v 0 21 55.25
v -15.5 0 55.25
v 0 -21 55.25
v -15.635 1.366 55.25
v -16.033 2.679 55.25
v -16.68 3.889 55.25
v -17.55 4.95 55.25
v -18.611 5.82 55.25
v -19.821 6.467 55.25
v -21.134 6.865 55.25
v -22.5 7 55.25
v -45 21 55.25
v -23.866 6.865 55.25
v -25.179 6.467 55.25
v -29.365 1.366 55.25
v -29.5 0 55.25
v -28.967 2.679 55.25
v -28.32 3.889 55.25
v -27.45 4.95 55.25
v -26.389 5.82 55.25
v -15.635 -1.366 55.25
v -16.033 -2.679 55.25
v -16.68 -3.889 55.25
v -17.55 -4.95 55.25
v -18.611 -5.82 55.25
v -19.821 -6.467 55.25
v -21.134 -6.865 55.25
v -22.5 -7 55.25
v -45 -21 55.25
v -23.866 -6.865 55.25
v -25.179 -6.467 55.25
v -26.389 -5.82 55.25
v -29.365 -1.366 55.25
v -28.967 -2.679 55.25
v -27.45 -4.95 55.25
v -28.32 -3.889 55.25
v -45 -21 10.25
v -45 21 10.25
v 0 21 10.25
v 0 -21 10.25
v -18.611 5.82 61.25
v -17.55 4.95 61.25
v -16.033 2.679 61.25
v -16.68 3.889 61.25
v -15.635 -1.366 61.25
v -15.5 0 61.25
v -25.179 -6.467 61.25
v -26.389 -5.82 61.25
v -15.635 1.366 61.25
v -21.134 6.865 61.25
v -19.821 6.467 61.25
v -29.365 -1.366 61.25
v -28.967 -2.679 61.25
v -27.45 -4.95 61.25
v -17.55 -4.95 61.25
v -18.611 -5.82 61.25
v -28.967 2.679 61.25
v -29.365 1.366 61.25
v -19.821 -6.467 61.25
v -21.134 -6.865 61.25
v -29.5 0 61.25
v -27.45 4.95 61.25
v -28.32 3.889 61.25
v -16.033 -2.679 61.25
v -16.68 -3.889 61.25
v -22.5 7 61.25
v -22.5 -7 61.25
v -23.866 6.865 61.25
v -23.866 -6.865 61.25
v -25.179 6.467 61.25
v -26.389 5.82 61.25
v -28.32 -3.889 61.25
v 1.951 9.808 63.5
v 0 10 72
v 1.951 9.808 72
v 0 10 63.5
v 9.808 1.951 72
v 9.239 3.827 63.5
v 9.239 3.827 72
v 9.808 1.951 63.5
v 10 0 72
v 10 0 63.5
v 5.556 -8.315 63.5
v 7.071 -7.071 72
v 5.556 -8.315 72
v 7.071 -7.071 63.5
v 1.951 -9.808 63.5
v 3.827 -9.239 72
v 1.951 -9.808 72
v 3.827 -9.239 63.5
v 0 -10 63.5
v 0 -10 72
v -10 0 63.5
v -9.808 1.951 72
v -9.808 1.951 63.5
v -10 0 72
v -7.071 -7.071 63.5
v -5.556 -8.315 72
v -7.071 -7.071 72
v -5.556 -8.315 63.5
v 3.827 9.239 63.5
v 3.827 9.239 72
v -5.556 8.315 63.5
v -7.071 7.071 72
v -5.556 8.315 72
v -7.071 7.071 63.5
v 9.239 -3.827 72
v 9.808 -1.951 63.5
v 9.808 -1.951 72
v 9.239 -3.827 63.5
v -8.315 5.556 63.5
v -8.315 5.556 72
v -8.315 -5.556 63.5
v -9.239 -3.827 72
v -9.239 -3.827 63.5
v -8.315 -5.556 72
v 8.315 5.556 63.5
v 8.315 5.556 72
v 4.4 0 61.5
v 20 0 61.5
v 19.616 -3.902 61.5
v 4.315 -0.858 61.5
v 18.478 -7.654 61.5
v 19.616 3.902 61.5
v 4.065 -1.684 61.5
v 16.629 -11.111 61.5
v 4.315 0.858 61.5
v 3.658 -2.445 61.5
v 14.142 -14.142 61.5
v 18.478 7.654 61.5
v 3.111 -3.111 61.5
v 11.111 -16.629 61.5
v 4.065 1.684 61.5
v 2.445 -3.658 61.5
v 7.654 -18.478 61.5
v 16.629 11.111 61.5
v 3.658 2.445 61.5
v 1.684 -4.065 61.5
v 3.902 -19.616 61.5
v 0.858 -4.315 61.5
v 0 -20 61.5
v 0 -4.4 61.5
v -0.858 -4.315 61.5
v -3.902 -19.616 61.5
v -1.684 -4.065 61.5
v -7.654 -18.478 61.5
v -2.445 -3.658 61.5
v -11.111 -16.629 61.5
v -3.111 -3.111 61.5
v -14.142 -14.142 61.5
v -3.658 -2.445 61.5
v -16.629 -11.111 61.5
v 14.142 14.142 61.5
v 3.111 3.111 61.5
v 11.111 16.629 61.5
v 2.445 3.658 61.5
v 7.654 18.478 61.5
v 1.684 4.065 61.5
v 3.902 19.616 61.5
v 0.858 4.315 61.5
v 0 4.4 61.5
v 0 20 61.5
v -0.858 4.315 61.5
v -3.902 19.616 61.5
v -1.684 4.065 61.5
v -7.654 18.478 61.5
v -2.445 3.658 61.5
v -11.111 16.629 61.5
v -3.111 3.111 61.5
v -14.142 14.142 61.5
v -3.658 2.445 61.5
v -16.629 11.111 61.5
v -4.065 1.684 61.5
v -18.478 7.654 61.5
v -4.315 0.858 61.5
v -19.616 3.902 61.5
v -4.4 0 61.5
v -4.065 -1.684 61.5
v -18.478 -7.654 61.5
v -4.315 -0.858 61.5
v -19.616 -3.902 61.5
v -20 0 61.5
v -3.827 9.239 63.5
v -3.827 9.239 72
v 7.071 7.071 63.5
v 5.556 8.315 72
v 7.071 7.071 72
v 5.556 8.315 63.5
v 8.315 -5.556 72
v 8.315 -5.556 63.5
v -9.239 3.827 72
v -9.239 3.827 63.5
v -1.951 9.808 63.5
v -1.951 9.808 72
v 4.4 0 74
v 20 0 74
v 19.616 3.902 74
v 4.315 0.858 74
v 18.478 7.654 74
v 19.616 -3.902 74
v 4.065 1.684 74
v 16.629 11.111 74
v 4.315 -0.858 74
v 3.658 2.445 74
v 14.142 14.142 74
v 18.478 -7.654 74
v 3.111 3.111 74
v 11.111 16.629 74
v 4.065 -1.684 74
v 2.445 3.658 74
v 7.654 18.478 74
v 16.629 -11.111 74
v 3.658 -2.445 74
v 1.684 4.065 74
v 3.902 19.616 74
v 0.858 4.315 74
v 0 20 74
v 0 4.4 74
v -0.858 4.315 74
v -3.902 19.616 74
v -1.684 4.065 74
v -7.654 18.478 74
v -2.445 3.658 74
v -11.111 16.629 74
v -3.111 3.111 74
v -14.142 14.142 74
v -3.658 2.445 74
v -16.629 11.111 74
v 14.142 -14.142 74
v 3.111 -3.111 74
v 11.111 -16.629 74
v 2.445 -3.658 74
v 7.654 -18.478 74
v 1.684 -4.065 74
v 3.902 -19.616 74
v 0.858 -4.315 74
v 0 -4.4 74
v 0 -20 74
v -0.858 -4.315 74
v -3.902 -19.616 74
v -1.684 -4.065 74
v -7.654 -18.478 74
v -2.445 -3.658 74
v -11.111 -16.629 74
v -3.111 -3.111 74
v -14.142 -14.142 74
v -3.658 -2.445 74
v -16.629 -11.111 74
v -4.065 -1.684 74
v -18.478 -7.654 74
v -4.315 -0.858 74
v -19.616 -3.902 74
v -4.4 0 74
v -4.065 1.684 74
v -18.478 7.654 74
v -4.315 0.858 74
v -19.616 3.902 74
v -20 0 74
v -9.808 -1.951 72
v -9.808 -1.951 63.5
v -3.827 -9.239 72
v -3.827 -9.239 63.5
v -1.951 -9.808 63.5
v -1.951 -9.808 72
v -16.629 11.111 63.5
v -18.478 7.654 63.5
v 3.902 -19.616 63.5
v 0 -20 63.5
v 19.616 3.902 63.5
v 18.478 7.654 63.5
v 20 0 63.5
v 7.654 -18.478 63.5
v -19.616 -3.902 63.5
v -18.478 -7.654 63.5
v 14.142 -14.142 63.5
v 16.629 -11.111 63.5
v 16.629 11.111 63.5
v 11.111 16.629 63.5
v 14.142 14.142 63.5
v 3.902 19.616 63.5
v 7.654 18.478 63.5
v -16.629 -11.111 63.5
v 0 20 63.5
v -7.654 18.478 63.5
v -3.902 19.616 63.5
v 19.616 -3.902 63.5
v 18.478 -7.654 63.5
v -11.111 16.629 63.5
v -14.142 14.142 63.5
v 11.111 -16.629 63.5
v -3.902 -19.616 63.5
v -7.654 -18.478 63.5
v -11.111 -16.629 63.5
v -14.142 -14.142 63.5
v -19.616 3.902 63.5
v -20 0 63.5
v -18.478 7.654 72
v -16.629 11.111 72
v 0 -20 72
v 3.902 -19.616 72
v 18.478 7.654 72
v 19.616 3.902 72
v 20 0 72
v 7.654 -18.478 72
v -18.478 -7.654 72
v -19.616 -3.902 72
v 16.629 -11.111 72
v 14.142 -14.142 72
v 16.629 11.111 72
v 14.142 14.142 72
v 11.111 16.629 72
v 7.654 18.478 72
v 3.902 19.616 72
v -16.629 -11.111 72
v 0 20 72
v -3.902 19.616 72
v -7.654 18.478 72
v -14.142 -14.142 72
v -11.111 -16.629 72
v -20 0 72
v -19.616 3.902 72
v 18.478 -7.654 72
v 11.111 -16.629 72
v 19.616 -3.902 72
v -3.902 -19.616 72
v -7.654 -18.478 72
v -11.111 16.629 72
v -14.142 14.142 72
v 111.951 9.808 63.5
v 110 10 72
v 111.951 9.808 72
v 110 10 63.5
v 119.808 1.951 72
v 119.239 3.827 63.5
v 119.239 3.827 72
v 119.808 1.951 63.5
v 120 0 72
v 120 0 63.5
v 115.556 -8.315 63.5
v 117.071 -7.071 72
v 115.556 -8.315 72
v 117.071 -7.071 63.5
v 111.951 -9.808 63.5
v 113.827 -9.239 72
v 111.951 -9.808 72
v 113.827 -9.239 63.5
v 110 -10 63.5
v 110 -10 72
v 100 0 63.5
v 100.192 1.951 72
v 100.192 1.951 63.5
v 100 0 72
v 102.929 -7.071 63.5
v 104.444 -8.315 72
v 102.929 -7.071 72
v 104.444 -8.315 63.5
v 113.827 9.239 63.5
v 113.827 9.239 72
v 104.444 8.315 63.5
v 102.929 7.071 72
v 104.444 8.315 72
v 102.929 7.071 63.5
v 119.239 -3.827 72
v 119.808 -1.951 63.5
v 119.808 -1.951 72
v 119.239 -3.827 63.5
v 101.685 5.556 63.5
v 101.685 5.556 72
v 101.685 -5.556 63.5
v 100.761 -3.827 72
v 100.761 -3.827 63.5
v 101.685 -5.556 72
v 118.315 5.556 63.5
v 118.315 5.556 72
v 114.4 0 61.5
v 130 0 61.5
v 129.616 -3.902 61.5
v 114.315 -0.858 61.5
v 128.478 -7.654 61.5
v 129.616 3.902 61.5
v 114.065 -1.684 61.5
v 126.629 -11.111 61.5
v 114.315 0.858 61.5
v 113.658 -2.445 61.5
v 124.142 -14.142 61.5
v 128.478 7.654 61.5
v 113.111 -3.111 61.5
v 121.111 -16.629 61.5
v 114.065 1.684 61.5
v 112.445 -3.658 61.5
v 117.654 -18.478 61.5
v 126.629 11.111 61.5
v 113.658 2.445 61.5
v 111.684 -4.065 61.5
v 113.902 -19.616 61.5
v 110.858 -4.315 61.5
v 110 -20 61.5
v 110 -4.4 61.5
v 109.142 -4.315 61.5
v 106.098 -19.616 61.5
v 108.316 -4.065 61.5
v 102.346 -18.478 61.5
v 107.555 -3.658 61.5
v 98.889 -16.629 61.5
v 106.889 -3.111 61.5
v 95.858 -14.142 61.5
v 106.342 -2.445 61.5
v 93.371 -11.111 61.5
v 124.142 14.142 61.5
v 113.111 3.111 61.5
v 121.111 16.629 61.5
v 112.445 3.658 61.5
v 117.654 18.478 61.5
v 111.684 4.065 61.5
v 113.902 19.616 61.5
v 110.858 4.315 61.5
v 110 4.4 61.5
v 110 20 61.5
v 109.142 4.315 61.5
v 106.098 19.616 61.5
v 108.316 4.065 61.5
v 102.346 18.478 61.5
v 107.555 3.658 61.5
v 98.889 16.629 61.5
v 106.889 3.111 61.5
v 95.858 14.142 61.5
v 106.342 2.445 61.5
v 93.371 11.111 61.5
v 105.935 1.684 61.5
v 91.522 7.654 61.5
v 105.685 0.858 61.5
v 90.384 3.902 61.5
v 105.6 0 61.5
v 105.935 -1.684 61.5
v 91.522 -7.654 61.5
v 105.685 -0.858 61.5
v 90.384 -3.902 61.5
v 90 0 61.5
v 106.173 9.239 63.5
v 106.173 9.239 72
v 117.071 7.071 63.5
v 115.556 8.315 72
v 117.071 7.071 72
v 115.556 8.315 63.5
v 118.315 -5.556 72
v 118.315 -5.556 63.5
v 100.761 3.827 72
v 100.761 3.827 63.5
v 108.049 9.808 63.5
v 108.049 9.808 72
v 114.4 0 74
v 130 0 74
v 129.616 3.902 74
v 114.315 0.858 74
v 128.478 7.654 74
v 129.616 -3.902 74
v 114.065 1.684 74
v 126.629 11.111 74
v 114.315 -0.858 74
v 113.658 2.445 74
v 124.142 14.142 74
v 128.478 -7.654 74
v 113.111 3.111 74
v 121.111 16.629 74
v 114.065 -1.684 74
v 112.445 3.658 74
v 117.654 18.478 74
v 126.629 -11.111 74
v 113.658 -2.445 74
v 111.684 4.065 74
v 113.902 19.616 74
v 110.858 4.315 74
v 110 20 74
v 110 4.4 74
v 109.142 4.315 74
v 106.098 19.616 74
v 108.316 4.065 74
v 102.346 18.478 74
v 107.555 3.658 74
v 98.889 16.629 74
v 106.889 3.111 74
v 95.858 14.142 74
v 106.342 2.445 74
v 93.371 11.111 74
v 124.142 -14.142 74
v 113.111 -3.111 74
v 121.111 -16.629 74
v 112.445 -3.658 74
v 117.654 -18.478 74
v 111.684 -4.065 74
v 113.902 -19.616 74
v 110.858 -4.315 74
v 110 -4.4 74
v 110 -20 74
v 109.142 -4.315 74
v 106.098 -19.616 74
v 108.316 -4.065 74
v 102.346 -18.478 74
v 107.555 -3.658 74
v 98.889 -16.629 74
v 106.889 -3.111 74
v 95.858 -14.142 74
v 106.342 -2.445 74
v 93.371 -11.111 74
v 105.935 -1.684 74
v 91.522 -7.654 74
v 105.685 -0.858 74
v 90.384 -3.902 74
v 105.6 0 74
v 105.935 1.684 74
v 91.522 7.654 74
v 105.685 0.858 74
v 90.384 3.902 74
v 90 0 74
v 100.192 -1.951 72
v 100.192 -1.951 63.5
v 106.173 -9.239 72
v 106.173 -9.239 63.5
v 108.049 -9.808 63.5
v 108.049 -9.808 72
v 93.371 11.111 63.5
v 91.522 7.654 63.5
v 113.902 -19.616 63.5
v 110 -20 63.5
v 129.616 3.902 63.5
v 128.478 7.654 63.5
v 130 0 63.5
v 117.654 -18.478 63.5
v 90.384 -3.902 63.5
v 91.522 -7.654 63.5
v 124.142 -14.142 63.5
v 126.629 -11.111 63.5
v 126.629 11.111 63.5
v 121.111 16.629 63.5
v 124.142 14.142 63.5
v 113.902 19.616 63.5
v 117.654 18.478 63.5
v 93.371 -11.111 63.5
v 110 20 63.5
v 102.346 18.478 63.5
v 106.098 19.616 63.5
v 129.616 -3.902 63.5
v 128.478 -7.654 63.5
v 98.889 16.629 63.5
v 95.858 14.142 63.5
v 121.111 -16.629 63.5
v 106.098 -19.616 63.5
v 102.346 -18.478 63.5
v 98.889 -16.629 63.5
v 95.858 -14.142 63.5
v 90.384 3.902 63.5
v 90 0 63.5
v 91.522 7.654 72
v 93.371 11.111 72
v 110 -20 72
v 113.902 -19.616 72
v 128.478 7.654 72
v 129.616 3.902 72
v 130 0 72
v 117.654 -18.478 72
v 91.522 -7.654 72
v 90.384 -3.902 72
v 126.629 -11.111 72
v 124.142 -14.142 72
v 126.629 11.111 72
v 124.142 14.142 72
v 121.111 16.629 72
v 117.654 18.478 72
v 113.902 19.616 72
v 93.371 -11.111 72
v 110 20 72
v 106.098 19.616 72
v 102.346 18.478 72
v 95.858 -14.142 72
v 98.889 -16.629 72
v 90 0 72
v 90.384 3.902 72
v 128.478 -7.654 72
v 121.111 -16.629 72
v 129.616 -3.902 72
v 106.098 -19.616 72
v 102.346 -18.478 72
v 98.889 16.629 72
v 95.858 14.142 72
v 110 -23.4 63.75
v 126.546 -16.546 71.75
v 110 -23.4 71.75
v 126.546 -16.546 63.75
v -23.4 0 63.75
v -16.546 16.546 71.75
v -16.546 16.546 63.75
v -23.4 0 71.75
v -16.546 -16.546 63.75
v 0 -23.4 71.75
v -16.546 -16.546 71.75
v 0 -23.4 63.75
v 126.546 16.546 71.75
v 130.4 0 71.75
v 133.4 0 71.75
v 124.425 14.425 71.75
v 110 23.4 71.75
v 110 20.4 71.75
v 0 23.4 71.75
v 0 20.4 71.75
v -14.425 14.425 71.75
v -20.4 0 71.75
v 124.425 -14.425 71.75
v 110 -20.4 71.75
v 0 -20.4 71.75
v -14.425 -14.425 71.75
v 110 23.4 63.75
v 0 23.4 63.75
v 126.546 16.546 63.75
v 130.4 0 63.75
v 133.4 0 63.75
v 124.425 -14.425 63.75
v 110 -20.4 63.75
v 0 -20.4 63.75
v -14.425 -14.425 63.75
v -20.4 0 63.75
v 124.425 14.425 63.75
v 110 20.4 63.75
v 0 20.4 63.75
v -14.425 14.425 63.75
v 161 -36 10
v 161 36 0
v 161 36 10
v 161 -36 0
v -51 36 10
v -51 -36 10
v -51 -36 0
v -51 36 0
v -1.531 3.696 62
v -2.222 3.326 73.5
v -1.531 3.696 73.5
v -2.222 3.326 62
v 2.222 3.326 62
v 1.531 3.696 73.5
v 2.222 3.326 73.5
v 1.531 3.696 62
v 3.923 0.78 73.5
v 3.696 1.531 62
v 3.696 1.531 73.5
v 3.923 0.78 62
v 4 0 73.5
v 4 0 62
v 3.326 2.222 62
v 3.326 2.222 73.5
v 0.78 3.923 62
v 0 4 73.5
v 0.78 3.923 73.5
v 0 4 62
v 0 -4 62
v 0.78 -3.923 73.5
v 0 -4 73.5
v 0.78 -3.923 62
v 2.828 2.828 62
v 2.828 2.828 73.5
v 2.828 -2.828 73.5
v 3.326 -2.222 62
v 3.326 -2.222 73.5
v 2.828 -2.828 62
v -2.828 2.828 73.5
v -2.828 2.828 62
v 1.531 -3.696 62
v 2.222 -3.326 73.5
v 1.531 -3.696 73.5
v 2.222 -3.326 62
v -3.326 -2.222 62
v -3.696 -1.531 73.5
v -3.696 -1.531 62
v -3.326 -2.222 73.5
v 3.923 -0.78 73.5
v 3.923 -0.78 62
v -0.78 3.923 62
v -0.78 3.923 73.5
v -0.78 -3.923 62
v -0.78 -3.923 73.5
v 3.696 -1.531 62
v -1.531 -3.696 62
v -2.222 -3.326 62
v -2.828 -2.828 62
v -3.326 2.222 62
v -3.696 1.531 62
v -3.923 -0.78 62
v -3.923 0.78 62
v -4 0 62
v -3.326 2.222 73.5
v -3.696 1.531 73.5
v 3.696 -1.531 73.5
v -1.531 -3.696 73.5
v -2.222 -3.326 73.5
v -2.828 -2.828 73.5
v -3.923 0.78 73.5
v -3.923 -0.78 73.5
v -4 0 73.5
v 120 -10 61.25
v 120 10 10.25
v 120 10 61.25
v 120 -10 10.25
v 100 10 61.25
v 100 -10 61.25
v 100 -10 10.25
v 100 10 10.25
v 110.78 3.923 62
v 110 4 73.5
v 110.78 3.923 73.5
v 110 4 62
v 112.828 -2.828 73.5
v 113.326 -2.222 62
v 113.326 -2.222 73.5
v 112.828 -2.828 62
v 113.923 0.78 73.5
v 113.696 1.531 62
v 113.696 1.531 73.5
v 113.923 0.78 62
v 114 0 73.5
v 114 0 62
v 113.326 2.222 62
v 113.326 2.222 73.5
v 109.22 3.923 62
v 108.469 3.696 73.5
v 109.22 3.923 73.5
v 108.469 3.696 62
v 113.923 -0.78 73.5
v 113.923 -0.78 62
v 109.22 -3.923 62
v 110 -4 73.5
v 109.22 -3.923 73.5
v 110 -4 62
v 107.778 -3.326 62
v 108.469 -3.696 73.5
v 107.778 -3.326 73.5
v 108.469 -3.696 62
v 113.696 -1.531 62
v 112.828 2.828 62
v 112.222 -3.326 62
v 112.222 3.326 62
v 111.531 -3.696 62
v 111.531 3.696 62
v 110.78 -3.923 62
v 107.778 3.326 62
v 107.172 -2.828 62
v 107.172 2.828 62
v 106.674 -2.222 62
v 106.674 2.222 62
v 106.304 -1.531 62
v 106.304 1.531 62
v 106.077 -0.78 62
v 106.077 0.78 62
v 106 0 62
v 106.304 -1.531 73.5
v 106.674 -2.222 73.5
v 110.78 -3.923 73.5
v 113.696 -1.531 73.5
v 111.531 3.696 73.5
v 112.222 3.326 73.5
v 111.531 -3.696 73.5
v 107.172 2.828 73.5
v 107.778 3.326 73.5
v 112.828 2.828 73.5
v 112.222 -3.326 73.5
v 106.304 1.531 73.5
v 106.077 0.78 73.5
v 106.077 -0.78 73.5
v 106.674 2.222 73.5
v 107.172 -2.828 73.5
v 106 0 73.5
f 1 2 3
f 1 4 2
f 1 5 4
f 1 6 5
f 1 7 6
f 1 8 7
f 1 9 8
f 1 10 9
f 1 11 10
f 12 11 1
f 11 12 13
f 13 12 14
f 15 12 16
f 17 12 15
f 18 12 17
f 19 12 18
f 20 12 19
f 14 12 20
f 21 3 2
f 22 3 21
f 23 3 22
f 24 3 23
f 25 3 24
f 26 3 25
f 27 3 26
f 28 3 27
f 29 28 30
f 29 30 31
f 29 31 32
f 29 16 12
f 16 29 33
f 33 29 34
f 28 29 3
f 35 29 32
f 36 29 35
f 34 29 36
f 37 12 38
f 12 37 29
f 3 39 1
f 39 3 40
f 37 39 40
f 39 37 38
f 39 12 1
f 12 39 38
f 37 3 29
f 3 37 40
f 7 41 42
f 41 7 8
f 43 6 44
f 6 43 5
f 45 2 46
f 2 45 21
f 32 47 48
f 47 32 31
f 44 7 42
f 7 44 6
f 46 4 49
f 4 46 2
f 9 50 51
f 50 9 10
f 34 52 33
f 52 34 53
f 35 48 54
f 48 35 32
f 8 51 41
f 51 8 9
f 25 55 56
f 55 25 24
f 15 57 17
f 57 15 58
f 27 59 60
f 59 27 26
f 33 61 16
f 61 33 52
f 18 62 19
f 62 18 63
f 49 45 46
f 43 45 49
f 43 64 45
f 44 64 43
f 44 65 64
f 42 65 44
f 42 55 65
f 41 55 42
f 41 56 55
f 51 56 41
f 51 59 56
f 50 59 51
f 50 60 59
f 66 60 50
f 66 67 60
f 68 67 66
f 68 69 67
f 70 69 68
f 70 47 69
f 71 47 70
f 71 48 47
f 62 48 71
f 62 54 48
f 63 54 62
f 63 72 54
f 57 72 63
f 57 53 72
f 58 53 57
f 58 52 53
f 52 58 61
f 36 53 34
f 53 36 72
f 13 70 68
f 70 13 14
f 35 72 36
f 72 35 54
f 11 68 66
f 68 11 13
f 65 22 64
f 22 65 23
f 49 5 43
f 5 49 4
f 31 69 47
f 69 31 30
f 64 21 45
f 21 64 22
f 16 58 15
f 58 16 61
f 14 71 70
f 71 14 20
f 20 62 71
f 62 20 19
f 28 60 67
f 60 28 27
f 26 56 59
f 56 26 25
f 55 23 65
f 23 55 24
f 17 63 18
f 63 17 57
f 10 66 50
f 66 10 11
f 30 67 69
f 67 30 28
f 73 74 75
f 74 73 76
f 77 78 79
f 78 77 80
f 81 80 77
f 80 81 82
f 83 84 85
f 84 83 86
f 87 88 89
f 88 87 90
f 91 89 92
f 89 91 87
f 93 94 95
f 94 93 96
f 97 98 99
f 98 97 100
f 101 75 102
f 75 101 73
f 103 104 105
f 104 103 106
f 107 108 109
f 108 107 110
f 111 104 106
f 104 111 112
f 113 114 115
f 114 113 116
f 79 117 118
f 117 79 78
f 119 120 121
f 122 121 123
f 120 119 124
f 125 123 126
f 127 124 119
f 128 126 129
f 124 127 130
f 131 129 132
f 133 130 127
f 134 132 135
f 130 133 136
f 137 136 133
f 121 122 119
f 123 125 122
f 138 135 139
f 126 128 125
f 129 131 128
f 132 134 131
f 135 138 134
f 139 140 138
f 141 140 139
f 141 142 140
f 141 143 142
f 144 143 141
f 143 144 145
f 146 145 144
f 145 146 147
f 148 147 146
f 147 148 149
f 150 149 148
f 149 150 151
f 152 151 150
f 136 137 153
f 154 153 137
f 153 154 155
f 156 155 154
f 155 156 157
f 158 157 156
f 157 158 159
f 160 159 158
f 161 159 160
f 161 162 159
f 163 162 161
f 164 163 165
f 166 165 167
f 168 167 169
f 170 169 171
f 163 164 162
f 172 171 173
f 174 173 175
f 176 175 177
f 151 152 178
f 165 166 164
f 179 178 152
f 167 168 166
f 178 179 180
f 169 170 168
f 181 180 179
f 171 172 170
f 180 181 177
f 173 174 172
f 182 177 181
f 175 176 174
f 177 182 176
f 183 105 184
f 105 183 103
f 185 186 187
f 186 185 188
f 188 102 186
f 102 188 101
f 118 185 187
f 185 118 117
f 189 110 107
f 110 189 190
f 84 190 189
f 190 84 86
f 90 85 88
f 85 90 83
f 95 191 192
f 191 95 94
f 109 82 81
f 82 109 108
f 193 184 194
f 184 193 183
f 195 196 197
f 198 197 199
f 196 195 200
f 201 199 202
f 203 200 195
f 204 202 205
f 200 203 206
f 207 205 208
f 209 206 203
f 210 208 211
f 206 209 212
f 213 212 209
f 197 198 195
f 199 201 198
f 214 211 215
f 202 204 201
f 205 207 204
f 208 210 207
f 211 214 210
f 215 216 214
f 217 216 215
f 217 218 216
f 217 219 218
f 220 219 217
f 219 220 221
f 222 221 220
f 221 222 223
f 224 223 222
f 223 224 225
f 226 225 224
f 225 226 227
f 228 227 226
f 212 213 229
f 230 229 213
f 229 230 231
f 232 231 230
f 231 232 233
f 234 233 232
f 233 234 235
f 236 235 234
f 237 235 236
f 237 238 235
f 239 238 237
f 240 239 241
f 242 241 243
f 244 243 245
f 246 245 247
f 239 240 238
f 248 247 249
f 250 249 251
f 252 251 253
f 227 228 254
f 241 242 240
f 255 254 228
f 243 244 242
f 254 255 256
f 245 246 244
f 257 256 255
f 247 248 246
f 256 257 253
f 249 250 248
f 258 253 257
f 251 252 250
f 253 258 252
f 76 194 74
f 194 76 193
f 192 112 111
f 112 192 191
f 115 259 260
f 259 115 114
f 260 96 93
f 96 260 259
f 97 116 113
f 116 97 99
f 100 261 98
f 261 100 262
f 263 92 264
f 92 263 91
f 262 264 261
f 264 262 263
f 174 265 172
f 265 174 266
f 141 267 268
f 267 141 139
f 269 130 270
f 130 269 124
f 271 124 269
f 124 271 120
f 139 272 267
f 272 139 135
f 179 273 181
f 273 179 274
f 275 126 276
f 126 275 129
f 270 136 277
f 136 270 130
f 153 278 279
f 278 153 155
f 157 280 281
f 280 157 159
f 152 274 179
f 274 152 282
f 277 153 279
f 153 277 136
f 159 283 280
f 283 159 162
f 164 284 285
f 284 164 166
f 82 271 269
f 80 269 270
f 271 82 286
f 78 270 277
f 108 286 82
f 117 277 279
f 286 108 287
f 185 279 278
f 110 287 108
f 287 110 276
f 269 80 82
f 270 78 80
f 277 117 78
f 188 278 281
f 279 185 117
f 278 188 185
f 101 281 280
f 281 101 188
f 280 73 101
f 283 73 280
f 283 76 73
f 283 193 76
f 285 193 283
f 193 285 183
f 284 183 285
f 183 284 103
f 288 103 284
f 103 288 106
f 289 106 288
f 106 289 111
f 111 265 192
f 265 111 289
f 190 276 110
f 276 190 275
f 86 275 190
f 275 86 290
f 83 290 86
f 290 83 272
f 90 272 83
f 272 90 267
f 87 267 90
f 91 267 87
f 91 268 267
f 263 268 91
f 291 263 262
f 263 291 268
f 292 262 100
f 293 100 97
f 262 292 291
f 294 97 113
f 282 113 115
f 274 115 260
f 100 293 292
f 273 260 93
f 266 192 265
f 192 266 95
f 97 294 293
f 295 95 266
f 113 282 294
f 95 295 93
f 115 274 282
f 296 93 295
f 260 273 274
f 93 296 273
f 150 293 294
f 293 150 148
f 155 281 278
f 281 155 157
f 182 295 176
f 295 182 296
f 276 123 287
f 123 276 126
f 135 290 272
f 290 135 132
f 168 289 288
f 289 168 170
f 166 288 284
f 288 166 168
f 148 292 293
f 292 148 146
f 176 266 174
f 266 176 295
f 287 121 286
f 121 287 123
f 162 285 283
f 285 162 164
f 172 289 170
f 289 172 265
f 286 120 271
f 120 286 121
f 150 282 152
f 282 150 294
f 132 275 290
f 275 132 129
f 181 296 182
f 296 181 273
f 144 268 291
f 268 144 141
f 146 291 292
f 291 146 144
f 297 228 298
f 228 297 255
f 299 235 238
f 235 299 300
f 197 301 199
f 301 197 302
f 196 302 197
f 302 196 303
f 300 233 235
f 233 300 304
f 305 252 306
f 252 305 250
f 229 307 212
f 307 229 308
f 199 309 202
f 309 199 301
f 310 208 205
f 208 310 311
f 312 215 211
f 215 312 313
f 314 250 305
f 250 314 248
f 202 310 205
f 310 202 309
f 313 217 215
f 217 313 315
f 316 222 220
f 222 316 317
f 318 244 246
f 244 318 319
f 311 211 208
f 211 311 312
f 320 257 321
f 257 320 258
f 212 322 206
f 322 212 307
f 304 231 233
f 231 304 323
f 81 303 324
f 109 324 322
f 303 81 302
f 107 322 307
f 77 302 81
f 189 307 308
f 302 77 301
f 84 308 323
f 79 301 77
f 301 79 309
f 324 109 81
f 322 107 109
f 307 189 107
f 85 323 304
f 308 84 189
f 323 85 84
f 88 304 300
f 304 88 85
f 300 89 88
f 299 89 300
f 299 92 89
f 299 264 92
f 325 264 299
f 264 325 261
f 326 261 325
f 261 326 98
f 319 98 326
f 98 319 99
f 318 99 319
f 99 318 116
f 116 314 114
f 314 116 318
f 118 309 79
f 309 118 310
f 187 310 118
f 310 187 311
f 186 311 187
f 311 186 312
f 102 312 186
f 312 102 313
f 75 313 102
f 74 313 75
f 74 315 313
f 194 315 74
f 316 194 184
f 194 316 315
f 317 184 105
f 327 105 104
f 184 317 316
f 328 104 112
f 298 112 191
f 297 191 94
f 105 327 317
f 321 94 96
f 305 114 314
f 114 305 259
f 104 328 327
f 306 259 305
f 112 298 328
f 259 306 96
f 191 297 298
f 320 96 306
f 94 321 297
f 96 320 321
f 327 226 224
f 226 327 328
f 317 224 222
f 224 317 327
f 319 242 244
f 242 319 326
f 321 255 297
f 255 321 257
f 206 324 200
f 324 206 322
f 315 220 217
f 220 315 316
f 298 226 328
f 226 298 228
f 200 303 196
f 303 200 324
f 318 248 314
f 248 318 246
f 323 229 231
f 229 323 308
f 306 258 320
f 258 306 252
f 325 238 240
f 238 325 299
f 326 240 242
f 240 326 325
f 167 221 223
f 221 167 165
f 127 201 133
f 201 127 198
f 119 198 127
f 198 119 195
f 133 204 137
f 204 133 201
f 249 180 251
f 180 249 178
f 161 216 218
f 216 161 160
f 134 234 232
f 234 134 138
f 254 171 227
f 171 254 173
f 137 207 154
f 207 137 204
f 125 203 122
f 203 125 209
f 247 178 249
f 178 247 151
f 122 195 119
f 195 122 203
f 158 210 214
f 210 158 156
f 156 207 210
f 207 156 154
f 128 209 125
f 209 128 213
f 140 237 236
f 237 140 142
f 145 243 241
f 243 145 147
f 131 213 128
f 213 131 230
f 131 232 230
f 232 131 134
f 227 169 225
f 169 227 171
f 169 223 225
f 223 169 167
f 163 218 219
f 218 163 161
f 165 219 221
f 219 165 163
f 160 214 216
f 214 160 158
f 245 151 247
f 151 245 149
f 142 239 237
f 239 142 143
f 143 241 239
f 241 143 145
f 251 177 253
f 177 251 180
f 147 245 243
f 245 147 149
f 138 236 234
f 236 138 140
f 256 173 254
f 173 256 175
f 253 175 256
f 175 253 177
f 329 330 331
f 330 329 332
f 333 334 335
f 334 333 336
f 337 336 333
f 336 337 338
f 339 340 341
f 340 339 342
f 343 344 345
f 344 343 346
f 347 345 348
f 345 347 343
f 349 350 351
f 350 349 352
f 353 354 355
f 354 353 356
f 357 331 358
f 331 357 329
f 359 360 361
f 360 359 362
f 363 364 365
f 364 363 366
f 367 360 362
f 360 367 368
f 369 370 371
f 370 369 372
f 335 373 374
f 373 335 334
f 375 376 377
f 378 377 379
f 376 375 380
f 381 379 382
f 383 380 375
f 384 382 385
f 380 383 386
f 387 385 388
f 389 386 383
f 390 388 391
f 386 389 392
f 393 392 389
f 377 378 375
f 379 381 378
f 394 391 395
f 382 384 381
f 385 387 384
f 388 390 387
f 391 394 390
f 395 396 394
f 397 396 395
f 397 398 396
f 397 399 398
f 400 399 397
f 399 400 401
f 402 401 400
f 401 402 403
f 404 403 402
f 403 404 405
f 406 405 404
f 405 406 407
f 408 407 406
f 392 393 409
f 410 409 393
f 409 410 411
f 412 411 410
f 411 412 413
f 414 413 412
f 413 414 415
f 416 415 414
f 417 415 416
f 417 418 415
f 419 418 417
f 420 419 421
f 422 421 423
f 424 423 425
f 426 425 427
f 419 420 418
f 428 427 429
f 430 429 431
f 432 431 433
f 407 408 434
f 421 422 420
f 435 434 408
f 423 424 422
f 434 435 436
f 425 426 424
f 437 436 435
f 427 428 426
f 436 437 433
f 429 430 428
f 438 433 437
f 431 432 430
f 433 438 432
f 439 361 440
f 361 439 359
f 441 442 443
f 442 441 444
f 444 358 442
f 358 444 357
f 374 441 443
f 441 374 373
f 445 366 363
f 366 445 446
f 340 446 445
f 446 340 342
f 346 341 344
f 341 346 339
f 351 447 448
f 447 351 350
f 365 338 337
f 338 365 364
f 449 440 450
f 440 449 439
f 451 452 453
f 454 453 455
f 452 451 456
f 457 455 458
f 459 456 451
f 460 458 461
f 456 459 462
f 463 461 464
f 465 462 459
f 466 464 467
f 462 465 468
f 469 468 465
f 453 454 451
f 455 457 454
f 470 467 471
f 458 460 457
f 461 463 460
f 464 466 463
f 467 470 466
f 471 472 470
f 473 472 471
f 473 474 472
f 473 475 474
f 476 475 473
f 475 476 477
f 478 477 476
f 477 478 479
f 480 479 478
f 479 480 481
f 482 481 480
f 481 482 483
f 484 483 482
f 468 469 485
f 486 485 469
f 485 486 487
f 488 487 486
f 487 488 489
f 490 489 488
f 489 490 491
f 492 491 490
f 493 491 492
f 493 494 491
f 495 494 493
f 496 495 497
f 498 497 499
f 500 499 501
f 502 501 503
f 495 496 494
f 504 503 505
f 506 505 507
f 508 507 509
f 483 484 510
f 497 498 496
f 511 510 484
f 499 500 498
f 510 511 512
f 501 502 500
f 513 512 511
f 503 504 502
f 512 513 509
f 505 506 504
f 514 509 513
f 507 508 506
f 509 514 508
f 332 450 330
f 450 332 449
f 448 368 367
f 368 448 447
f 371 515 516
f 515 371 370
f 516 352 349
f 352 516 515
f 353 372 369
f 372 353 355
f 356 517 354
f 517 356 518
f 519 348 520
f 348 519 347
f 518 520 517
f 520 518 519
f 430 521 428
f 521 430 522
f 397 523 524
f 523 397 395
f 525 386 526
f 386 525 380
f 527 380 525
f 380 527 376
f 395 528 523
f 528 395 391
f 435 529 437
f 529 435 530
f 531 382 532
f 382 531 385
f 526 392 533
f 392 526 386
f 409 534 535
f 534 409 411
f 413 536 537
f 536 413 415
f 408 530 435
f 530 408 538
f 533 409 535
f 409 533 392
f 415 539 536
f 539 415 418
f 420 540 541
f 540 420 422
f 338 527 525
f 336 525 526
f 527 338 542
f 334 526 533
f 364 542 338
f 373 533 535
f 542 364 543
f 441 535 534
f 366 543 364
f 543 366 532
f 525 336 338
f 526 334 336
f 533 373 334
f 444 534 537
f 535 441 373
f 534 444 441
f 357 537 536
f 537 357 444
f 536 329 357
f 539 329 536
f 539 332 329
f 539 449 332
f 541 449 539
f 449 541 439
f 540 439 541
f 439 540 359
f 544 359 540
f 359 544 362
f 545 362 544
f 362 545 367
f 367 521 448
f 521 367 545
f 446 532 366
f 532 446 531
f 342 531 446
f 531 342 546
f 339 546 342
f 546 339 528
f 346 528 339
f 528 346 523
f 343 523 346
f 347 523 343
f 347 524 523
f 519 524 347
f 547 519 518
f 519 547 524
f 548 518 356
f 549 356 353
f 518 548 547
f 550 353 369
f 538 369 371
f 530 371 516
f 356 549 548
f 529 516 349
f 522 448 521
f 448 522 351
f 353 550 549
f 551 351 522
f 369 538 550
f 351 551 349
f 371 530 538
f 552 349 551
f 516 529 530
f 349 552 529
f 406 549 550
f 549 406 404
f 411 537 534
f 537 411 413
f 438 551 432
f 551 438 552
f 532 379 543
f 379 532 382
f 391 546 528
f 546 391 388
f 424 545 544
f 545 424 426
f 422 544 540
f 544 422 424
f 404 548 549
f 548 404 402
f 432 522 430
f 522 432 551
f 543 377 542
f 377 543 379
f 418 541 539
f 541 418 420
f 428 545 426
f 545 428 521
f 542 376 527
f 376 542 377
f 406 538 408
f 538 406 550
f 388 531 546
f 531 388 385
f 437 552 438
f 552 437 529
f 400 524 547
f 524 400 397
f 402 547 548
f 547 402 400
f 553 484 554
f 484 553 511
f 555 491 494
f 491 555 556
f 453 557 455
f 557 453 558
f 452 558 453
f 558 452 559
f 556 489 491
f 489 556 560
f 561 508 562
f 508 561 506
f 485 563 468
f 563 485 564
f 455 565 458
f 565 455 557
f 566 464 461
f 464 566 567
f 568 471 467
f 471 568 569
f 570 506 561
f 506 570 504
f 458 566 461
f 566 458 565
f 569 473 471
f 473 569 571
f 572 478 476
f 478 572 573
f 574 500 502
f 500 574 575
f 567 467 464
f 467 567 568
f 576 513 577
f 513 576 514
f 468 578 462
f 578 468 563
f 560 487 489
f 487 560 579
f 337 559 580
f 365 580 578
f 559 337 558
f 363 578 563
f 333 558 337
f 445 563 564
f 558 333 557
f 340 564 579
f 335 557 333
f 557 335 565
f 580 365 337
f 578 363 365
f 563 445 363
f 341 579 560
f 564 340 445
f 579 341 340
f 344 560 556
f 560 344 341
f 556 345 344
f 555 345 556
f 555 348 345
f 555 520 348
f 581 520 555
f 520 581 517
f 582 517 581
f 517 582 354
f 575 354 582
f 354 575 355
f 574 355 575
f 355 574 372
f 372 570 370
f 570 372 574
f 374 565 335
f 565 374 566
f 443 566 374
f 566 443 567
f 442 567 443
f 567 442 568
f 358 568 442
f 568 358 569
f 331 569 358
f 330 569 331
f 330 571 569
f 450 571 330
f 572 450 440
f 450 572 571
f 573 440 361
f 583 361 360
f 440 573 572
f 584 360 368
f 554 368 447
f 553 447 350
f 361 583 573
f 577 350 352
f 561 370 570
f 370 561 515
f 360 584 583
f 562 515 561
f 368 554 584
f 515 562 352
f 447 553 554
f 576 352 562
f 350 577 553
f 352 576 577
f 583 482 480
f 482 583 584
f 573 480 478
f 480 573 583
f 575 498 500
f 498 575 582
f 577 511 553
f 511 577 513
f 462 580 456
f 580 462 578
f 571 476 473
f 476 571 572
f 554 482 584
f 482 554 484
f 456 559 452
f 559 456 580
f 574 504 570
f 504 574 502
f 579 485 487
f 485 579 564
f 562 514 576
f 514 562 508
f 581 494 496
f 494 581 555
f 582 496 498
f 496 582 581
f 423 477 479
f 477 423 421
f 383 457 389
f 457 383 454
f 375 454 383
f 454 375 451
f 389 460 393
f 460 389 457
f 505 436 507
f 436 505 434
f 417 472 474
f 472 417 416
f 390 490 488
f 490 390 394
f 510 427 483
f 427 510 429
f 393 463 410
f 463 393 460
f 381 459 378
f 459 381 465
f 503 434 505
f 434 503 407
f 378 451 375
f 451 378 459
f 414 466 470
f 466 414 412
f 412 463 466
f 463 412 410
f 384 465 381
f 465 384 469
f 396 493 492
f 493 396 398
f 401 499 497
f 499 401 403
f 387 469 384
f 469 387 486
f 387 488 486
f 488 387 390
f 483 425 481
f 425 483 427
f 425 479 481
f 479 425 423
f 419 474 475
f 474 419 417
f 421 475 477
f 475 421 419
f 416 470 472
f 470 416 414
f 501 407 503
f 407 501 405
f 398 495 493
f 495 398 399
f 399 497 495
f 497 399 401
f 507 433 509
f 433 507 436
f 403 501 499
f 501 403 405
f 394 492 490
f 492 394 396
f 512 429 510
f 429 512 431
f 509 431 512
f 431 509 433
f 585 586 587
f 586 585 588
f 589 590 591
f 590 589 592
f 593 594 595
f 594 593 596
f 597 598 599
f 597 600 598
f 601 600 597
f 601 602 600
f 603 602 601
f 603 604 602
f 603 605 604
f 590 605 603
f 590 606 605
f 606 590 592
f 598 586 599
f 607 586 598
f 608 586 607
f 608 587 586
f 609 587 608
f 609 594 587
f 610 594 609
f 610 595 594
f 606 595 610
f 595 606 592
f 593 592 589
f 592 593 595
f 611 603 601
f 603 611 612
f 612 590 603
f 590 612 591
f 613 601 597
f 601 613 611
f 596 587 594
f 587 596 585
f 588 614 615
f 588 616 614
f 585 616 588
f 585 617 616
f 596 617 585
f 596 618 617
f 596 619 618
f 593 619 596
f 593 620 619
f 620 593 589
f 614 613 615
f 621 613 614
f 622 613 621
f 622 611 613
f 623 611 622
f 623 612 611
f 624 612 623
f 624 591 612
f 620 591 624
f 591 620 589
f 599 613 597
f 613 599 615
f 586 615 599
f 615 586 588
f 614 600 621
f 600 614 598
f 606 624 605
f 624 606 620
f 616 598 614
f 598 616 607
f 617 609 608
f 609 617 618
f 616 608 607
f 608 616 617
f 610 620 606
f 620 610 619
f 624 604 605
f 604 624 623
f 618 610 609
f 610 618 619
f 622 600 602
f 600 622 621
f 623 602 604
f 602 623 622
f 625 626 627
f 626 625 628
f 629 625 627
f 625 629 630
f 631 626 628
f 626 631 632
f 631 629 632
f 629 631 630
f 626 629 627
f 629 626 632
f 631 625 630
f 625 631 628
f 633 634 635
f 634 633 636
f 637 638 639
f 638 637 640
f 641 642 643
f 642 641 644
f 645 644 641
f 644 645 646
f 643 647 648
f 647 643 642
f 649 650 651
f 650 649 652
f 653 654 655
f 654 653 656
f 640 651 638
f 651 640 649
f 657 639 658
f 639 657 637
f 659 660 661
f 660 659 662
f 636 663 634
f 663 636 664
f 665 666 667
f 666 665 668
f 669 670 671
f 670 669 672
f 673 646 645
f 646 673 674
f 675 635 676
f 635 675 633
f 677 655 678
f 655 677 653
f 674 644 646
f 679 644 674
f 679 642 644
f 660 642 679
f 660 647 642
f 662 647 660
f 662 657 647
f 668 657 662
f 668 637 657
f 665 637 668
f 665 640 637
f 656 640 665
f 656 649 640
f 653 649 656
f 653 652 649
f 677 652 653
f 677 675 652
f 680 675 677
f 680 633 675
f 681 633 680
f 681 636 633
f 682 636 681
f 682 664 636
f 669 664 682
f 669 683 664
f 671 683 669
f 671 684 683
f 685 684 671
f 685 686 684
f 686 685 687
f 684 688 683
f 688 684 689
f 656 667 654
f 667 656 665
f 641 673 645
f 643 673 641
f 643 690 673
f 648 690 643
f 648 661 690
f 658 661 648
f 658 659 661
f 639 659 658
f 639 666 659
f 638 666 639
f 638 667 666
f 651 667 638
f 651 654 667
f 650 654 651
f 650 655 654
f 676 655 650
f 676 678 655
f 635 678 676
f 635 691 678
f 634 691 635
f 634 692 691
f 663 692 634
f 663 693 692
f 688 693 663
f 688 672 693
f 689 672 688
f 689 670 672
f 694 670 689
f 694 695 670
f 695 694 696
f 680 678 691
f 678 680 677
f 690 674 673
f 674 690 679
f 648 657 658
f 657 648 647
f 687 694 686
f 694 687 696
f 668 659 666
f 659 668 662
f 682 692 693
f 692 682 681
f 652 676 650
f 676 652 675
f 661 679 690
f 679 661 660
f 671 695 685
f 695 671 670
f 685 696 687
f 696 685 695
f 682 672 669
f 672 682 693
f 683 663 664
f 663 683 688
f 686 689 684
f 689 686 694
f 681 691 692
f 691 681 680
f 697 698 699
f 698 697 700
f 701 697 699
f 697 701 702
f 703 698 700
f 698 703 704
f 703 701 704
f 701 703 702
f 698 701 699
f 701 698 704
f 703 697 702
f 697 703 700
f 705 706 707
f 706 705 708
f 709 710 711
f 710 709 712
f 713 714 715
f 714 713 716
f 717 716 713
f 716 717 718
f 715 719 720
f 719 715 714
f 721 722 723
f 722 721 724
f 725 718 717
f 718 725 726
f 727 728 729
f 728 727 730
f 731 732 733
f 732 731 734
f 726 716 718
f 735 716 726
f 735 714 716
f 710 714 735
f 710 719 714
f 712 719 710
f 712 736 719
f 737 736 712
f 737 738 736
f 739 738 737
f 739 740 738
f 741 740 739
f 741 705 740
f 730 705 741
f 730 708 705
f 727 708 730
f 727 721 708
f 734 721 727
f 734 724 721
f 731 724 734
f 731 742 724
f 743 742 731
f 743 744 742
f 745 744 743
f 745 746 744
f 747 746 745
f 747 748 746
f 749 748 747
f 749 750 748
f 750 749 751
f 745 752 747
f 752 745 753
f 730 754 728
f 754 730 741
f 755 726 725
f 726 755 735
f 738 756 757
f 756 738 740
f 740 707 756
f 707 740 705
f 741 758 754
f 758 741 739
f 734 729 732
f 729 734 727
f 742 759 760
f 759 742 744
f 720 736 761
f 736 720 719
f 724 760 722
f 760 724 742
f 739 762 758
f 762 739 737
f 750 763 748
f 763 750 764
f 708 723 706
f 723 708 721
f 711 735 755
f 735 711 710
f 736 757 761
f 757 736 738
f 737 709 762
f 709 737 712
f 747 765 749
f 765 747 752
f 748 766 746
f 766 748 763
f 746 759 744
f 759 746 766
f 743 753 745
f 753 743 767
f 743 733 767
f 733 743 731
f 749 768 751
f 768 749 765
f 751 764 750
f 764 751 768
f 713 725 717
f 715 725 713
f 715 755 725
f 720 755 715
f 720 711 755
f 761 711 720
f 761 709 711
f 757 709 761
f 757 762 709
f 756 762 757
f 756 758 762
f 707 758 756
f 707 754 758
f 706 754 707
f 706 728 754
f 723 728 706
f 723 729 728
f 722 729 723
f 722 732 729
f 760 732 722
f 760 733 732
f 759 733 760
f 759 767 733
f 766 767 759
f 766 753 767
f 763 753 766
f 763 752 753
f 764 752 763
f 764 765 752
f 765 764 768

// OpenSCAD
$fn = 32;

// ------------------------------------------------------------------------
// Motor belt drive: span 110 mm, pulleys d40, belt 8 mm wide
// Every part is its own module, assembly() places every instance.
// ------------------------------------------------------------------------

// --- part 1 ---
module base_plate() {
  difference() {
    translate([-106, -36, 0]) cube([212, 72, 10]);
  }
}

// --- part 2 ---
module motor() {
  union() {
    translate([-22.5, -21, 0]) cube([45, 42, 45]);
    translate([25.5, 0, 22.5]) rotate([0, 90, 0]) cylinder(h = 6, d = 14, center = true);
  }
}

// --- part 3 ---
module drive_shaft() {
  translate([0, 0, -5.75]) cylinder(h = 11.5, d = 8);
}

// --- part 4 ---
module pulley_drive() {
  difference() {
    union() {
      cylinder(h = 12.5, d = 20);
      cylinder(h = 2, d = 40);
      translate([0, 0, 10.5]) cylinder(h = 2, d = 40);
    }
    translate([0, 0, -1]) cylinder(h = 14.5, d = 8.8);
  }
}

// --- part 5 ---
module idler_post() {
  translate([-10, -10, 0]) cube([20, 20, 51]);
}

// --- part 6 ---
module driven_shaft() {
  translate([0, 0, -5.75]) cylinder(h = 11.5, d = 8);
}

// --- part 7 ---
module pulley_driven() {
  difference() {
    union() {
      cylinder(h = 12.5, d = 20);
      cylinder(h = 2, d = 40);
      translate([0, 0, 10.5]) cylinder(h = 2, d = 40);
    }
    translate([0, 0, -1]) cylinder(h = 14.5, d = 8.8);
  }
}

// --- part 8 ---
module drive_belt() {
  difference() {
    linear_extrude(height = 8) polygon(points = concat([for (a = [90 : 45 : 270]) [23.4 * cos(a), 23.4 * sin(a)]], [for (a = [270 : 45 : 450]) [110 + 23.4 * cos(a), 23.4 * sin(a)]]));
    translate([0, 0, -1]) linear_extrude(height = 10) polygon(points = concat([for (a = [90 : 45 : 270]) [20.4 * cos(a), 20.4 * sin(a)]], [for (a = [270 : 45 : 450]) [110 + 20.4 * cos(a), 20.4 * sin(a)]]));
  }
}

// --- assembly ---
module assembly() {
  color([0.80, 0.24, 0.20]) translate([55, 0, 0]) rotate([0, 0, 0]) base_plate();
  color([0.20, 0.45, 0.75]) translate([0, 0, 32.75]) rotate([0, 270, 0]) motor();
  color([0.25, 0.62, 0.32]) translate([0, 0, 67.75]) rotate([0, 0, 0]) drive_shaft();
  color([0.92, 0.70, 0.18]) translate([0, 0, 61.5]) rotate([0, 0, 0]) pulley_drive();
  color([0.58, 0.35, 0.70]) translate([110, 0, 10.25]) rotate([0, 0, 0]) idler_post();
  color([0.16, 0.66, 0.66]) translate([110, 0, 67.75]) rotate([0, 0, 0]) driven_shaft();
  color([0.85, 0.48, 0.18]) translate([110, 0, 61.5]) rotate([0, 0, 0]) pulley_driven();
  color([0.55, 0.60, 0.65]) translate([0, 0, 63.75]) rotate([0, 0, 0]) drive_belt();
}

assembly();
